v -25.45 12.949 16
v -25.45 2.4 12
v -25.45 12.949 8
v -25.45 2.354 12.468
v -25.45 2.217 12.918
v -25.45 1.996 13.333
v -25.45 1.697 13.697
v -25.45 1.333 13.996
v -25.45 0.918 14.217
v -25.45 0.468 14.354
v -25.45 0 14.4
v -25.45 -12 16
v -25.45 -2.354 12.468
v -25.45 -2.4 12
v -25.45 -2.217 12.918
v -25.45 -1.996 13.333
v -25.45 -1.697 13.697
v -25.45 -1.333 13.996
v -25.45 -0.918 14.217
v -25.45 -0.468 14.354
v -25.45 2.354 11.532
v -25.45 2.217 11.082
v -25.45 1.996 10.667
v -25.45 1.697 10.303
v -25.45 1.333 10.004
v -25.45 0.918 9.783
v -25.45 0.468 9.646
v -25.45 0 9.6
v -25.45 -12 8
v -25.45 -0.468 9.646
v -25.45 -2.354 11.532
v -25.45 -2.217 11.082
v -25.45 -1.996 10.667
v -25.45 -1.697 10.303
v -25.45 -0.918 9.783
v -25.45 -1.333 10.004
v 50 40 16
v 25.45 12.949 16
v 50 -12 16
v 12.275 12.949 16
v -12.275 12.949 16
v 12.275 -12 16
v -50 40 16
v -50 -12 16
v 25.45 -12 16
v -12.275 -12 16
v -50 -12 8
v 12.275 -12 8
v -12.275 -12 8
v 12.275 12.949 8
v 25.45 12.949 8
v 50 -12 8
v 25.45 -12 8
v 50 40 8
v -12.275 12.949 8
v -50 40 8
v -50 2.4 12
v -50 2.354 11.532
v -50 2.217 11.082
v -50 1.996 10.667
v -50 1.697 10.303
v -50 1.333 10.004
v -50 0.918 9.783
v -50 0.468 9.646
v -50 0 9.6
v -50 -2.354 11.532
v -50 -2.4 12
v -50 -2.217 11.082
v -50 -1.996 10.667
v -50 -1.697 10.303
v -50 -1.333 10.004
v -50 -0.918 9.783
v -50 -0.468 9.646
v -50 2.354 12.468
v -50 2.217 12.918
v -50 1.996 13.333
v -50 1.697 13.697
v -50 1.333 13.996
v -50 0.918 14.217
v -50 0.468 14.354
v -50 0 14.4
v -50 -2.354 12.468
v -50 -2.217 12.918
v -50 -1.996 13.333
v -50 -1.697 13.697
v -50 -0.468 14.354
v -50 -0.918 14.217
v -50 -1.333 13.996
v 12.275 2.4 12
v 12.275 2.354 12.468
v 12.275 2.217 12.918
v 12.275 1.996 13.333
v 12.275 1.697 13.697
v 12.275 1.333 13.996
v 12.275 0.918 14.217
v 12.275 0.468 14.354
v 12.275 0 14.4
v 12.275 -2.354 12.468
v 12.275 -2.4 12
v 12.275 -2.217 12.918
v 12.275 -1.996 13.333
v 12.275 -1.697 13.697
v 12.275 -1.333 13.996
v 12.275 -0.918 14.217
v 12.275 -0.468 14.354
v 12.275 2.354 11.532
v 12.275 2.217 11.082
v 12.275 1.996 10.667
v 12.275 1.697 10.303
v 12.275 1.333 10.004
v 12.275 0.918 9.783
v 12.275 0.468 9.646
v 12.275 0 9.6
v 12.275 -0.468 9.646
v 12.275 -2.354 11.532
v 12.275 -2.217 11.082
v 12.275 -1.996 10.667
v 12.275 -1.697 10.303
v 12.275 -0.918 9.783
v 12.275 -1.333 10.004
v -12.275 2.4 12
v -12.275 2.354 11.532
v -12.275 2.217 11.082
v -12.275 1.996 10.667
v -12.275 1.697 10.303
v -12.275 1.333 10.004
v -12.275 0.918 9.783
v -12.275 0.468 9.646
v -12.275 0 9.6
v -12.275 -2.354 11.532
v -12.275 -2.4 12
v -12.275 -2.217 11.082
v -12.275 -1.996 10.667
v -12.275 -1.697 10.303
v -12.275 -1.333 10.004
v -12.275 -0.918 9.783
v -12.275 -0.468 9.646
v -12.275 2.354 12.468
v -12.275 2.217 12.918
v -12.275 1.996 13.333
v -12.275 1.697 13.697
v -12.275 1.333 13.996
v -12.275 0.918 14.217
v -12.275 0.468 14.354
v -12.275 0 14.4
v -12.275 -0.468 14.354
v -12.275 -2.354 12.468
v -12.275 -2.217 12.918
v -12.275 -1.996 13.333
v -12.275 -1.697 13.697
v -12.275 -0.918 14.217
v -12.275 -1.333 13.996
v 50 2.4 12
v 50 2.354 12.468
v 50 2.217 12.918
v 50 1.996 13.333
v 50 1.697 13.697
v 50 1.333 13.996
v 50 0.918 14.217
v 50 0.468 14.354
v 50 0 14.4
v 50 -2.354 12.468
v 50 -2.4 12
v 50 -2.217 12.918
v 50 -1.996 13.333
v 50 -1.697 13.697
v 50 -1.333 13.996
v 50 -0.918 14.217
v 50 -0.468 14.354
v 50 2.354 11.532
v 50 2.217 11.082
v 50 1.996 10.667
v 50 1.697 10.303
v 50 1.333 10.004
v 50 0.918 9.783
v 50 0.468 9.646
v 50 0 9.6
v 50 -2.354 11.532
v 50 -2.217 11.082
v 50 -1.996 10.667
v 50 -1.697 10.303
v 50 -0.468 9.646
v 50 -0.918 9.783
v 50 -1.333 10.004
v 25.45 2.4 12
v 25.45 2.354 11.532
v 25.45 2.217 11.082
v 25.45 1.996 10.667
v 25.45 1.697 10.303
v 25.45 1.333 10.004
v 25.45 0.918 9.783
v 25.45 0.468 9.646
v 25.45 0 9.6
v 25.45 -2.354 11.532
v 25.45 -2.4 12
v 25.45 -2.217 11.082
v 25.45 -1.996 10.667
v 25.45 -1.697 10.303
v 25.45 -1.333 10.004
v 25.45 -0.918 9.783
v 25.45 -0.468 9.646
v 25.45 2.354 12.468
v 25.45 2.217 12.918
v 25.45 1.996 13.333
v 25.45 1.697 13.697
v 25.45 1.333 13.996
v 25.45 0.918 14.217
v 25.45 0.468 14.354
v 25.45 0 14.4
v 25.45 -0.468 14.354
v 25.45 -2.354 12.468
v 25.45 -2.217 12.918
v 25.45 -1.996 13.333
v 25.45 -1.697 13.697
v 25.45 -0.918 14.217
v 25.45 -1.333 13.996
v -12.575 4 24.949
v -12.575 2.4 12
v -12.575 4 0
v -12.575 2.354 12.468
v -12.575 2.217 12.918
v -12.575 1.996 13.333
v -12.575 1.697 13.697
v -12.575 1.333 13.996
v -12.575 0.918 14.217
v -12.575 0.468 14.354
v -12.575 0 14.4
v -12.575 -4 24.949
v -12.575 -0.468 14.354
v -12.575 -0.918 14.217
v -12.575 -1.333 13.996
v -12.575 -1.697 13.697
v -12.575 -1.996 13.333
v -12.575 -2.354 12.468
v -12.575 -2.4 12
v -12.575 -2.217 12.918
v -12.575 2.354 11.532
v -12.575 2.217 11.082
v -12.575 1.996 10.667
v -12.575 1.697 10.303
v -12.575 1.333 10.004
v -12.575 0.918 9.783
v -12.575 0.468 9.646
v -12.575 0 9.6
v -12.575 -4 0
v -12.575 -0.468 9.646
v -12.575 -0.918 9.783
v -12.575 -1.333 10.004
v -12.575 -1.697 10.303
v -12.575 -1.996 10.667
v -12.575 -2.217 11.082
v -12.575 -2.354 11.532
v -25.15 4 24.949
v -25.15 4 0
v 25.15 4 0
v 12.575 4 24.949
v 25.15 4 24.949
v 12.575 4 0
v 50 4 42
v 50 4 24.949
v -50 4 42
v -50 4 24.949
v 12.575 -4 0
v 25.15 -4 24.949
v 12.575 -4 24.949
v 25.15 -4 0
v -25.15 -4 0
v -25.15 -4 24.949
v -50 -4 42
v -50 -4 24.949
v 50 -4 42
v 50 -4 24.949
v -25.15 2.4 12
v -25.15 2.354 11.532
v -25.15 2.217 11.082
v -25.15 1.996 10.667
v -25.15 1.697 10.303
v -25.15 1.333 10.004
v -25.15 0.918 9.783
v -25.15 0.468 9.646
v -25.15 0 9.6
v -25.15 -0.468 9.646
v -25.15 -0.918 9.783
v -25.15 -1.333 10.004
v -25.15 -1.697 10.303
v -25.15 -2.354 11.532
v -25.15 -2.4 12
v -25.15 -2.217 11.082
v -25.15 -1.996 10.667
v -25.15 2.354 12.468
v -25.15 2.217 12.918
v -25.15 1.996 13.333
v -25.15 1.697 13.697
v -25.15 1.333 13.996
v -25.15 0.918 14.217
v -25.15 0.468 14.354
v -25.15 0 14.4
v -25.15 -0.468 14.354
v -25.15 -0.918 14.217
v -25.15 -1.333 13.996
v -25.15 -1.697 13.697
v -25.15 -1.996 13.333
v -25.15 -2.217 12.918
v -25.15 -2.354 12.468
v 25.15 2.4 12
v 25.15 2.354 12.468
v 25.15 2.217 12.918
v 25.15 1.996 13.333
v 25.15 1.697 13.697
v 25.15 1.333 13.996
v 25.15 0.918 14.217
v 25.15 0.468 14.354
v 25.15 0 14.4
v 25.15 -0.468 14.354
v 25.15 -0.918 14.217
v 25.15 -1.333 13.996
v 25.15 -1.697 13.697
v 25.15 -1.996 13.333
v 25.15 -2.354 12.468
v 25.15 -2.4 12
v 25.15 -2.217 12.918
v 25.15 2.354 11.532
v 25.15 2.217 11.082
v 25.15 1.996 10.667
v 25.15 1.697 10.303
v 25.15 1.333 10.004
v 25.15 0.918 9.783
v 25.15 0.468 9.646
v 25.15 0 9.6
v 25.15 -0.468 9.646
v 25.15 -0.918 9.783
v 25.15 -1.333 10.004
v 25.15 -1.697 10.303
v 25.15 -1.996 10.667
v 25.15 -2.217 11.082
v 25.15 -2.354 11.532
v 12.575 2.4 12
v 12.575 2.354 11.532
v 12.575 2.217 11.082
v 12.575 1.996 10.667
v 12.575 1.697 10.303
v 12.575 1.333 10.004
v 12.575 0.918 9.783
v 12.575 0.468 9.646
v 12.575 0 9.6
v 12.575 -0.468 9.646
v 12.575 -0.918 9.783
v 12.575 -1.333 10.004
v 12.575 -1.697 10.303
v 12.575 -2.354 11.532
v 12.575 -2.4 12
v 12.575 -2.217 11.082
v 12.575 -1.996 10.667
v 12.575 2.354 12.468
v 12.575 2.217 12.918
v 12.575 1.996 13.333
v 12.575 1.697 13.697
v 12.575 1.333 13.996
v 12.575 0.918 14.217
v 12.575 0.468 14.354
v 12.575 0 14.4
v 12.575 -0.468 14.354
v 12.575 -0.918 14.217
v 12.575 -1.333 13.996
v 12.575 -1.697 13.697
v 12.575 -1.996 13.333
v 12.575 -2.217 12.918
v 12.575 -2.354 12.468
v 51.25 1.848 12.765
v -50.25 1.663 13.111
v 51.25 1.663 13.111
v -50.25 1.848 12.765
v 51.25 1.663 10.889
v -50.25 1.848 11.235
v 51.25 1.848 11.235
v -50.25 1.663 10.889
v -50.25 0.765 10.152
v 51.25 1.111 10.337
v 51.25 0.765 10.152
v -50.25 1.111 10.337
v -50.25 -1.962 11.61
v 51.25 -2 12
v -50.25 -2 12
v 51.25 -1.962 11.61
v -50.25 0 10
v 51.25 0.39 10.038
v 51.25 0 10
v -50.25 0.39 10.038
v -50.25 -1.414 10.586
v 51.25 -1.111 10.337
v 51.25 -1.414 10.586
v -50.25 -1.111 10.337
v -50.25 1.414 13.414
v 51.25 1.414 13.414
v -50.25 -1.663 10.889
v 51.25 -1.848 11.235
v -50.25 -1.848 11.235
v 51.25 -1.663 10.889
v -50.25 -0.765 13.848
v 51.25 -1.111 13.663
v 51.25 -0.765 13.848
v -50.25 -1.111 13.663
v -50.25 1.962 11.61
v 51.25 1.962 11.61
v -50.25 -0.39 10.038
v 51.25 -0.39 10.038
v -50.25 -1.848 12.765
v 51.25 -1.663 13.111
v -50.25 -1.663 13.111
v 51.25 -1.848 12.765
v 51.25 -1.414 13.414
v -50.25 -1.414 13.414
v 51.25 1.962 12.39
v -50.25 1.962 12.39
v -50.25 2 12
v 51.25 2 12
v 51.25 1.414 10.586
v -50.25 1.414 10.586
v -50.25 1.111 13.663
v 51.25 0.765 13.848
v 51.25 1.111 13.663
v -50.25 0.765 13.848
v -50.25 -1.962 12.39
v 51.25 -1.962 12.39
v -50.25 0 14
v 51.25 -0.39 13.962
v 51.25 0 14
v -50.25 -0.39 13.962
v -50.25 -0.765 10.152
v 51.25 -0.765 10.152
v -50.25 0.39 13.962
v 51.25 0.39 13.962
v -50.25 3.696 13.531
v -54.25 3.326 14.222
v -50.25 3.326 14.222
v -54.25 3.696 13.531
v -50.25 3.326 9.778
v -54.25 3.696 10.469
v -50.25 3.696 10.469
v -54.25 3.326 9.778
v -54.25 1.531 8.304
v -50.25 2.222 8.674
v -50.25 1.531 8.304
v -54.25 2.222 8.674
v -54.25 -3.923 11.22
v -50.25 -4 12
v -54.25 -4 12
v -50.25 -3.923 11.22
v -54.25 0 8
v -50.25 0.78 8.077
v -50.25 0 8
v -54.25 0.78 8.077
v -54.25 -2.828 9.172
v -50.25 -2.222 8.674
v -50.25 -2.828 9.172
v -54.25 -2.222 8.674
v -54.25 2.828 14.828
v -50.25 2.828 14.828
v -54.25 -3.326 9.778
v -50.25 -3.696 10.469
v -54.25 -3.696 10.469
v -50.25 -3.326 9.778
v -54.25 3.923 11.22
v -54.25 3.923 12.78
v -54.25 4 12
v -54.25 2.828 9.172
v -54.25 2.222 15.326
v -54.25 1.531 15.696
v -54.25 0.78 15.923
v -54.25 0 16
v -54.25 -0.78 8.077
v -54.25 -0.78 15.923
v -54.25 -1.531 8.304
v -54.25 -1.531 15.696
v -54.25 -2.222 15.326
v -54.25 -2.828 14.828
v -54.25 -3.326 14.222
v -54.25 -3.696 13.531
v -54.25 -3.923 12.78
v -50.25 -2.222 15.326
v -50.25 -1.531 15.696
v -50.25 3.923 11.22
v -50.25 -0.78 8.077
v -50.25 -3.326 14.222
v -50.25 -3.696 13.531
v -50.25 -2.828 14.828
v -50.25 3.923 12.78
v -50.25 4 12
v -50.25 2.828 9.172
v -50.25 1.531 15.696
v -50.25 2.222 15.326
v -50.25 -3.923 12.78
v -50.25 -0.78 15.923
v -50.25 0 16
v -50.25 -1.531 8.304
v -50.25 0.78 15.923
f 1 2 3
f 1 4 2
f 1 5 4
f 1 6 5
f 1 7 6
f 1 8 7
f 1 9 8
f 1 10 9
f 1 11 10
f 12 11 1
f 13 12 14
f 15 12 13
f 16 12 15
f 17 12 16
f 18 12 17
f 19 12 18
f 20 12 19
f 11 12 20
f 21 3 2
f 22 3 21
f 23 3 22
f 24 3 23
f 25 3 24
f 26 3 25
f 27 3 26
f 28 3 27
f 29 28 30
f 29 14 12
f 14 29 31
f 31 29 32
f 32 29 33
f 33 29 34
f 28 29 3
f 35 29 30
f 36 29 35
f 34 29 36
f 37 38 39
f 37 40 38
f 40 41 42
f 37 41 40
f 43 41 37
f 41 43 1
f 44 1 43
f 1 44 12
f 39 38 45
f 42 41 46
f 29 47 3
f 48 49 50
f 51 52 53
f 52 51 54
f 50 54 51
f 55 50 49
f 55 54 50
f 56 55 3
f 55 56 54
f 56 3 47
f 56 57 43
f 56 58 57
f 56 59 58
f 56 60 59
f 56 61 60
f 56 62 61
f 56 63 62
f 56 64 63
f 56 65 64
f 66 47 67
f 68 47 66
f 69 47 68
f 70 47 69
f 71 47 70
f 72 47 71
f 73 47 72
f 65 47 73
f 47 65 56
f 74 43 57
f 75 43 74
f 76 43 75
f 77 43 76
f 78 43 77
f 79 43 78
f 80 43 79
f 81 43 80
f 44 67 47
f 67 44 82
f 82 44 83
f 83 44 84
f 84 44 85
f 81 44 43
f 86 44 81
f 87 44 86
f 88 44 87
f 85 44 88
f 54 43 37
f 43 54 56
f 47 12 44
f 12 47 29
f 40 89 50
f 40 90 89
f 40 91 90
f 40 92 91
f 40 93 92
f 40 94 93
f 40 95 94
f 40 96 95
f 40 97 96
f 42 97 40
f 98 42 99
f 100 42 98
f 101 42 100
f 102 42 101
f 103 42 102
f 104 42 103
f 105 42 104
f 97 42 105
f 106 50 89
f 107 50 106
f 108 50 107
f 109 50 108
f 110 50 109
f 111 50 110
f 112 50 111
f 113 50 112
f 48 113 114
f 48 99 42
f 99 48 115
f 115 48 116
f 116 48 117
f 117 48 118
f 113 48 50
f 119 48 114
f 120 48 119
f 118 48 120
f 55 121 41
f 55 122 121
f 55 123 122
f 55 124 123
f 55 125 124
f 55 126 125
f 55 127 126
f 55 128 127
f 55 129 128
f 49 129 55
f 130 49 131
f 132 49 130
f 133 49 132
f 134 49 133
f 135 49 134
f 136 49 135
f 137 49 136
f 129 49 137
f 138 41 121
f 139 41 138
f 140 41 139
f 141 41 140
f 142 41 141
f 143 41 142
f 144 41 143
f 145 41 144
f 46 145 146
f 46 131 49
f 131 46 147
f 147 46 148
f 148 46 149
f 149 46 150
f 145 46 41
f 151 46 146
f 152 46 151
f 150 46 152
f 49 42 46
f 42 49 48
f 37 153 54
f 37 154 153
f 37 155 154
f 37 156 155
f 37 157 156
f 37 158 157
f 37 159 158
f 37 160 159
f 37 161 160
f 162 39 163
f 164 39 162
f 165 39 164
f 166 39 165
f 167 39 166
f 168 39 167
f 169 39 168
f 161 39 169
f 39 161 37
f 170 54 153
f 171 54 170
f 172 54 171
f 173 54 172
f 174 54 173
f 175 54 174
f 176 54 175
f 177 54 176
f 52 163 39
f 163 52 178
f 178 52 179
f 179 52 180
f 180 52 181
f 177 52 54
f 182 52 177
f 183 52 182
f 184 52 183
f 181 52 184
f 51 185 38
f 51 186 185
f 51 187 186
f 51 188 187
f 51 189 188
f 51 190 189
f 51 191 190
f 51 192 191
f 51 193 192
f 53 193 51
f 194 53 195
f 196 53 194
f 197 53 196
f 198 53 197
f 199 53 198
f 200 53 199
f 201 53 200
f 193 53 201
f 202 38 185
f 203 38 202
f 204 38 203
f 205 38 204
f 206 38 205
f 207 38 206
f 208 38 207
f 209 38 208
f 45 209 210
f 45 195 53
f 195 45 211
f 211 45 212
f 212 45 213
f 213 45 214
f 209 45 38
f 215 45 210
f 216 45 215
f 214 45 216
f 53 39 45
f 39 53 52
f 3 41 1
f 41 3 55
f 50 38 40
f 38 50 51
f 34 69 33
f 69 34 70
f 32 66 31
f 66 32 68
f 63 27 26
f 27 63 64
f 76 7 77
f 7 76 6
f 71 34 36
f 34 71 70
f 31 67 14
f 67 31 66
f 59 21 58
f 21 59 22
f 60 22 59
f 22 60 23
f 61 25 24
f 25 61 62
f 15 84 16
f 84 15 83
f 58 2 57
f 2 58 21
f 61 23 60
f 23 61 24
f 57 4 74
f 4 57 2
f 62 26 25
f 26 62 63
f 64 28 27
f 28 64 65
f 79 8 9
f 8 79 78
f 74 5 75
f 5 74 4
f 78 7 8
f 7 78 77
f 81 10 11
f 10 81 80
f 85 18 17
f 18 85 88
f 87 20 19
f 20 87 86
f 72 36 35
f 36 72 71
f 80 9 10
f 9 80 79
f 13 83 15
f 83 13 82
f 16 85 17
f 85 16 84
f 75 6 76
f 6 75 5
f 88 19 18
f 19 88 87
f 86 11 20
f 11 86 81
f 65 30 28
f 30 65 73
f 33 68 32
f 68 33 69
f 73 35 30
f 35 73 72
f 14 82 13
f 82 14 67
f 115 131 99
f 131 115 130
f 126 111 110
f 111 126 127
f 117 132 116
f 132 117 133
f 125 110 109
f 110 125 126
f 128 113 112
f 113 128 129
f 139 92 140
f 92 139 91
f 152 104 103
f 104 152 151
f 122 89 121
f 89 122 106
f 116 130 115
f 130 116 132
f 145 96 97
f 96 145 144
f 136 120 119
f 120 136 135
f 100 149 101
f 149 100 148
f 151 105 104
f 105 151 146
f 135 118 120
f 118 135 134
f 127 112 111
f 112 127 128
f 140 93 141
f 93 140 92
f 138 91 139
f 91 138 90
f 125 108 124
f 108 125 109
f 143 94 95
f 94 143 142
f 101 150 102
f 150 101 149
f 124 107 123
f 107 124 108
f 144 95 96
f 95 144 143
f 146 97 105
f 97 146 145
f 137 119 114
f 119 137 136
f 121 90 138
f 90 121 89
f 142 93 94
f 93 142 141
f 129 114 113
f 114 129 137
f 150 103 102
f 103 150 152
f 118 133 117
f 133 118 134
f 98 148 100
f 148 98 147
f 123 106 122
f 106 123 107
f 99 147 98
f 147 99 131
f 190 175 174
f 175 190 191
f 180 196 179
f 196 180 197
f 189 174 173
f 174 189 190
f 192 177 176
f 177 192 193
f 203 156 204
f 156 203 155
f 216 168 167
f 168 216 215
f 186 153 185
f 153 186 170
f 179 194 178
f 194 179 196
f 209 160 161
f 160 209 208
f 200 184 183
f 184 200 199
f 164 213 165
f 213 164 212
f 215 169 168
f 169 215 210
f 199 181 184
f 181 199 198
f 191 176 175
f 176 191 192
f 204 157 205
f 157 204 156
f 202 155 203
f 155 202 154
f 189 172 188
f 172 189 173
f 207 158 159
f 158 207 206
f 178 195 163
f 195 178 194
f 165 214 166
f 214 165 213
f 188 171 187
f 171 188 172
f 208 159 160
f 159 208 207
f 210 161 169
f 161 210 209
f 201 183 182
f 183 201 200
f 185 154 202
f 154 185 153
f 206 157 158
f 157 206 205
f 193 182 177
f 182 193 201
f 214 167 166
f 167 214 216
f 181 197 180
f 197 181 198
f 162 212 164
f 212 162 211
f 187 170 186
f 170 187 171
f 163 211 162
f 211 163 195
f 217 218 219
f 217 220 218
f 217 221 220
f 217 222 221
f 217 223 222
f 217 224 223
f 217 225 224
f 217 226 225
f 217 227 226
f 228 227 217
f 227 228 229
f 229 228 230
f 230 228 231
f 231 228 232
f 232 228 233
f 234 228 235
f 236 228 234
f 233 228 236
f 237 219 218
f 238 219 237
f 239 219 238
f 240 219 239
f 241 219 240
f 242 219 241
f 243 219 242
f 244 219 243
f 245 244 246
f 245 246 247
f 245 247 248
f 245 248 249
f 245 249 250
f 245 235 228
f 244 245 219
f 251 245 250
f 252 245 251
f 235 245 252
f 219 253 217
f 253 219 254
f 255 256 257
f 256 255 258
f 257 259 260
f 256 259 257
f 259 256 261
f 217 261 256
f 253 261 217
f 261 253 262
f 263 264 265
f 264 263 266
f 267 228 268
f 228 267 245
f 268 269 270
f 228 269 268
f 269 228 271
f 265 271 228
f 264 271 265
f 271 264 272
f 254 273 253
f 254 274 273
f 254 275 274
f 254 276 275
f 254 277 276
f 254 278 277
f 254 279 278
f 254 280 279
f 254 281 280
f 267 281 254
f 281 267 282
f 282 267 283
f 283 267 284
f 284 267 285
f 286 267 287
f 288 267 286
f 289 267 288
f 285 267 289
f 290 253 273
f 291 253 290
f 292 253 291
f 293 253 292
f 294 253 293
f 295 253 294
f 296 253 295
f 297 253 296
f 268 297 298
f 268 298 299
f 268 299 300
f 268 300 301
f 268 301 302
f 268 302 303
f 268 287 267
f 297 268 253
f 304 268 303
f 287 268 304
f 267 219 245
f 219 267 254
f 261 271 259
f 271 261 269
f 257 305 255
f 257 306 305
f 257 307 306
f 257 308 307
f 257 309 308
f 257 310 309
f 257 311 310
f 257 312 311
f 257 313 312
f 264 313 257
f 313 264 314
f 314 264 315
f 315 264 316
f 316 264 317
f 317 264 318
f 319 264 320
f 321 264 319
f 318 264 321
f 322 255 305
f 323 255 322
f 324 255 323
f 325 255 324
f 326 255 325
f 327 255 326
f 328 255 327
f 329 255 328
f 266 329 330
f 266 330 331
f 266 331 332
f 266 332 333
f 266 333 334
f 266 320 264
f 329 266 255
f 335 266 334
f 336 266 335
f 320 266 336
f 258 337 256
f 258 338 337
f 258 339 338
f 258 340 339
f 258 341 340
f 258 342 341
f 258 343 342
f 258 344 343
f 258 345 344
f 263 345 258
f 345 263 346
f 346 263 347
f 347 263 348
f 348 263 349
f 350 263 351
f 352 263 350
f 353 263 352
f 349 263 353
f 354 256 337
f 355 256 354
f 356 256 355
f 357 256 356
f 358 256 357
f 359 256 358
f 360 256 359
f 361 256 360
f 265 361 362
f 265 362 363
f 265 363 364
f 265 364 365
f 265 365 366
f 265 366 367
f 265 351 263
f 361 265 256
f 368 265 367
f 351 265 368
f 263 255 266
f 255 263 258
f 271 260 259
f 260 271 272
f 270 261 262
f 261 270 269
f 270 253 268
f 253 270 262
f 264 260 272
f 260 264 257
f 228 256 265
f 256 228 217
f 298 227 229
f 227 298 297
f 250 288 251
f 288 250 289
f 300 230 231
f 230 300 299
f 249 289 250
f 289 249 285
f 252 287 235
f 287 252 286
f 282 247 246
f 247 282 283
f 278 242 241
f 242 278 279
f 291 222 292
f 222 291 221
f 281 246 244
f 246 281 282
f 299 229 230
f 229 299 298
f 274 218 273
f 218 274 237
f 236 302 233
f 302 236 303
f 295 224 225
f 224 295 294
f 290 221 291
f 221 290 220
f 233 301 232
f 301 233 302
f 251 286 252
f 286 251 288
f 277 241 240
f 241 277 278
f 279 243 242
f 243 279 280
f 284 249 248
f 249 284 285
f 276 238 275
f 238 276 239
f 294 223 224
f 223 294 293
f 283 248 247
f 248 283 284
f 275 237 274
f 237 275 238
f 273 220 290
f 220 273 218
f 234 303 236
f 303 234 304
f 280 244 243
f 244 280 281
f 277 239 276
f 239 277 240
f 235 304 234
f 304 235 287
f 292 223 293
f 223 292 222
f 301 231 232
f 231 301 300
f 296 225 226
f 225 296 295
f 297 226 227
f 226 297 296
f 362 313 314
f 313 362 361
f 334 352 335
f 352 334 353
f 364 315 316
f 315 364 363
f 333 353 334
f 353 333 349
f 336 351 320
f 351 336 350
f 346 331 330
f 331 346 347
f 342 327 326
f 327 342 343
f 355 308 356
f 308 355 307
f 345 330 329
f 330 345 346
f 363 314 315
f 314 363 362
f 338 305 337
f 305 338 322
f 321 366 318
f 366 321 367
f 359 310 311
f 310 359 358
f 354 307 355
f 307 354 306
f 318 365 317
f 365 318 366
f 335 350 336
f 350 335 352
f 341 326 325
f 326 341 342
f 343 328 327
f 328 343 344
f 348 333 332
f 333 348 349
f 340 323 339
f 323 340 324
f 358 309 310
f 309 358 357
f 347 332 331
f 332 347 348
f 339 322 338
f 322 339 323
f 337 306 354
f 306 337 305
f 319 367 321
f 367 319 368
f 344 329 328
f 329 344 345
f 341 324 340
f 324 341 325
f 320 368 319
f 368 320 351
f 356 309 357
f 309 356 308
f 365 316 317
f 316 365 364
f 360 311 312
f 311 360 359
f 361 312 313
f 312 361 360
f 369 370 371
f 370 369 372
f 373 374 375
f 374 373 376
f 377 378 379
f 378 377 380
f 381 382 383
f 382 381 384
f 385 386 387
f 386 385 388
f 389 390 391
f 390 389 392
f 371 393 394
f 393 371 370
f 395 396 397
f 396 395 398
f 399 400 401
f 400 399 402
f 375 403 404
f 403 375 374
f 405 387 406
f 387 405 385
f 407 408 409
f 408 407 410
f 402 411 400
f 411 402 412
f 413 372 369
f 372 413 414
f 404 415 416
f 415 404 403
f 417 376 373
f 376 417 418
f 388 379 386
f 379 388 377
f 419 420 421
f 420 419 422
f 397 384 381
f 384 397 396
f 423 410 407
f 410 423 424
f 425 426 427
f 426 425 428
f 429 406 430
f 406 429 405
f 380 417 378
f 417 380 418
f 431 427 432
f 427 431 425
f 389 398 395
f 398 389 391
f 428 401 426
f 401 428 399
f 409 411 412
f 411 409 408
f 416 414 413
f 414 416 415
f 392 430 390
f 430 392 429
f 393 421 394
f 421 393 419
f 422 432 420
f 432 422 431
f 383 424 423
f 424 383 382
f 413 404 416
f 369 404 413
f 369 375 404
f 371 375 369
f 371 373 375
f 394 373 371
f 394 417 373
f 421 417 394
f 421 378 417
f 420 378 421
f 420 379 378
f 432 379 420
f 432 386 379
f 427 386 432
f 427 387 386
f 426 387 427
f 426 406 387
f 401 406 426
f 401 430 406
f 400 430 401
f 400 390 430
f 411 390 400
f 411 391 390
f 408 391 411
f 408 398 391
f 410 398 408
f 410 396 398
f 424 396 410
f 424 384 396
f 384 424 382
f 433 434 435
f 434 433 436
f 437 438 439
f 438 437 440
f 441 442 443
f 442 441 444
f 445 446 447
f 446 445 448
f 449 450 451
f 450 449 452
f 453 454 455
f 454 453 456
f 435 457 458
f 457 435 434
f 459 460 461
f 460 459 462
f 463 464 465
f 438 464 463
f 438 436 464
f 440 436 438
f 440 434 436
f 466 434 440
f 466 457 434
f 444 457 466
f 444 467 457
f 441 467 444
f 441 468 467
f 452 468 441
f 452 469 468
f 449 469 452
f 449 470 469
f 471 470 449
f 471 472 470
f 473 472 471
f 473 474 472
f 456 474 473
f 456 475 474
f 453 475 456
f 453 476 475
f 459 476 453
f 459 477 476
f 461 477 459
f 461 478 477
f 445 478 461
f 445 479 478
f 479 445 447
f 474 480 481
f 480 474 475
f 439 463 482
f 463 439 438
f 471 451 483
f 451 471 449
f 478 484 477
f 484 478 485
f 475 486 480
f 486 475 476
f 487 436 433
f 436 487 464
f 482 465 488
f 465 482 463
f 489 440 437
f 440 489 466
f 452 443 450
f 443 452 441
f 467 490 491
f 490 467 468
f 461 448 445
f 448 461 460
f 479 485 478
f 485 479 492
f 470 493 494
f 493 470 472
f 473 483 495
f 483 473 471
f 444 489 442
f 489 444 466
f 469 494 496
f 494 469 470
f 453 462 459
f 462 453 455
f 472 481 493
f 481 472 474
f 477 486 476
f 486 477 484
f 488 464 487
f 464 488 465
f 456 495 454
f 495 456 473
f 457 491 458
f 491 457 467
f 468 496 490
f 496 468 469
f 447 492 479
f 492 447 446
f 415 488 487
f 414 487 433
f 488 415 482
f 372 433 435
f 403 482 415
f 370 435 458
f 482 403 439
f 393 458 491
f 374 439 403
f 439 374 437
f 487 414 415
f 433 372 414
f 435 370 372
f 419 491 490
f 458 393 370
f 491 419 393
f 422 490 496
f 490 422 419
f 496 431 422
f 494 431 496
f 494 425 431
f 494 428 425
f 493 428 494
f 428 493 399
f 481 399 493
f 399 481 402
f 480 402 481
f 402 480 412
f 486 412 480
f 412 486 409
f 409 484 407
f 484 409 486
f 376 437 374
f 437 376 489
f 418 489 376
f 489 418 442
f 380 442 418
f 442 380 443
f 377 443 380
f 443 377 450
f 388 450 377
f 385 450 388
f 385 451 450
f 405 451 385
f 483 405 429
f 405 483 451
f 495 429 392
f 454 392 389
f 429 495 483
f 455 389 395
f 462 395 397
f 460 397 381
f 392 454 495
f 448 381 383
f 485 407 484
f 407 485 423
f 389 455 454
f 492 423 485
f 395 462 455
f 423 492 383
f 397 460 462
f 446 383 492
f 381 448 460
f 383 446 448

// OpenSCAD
$fn = 32;

// ------------------------------------------------------------------------
// Butt hinge: hinge 100 mm, leaf swung 270 deg
// Every part is its own module, assembly() places every instance.
// ------------------------------------------------------------------------

// --- part 1 ---
module hinge_base() {
  difference() {
    union() {
      translate([-50, -12, -4]) cube([24.55, 52, 8]);
      translate([-12.275, -12, -4]) cube([24.55, 52, 8]);
      translate([25.45, -12, -4]) cube([24.55, 52, 8]);
      translate([-50, 12.949, -4]) cube([100, 27.051, 8]);
    }
    translate([-37.725, 0, 0]) rotate([0, 90, 0]) cylinder(h = 26.55, d = 4.8, center = true);
    translate([0, 0, 0]) rotate([0, 90, 0]) cylinder(h = 26.55, d = 4.8, center = true);
    translate([37.725, 0, 0]) rotate([0, 90, 0]) cylinder(h = 26.55, d = 4.8, center = true);
  }
}

// --- part 2 ---
module hinge_mover() {
  difference() {
    union() {
      translate([-25.15, -30, -4]) cube([12.575, 42, 8]);
      translate([12.575, -30, -4]) cube([12.575, 42, 8]);
      translate([-50, -30, -4]) cube([100, 17.051, 8]);
    }
    translate([-18.863, 0, 0]) rotate([0, 90, 0]) cylinder(h = 14.575, d = 4.8, center = true);
    translate([18.863, 0, 0]) rotate([0, 90, 0]) cylinder(h = 14.575, d = 4.8, center = true);
  }
}

// --- part 3 ---
module hinge_pin() {
  rotate([0, 90, 0]) cylinder(h = 102.5, d = 4, center = true);
  translate([-54.25, 0, 0]) rotate([0, 90, 0]) cylinder(h = 4, d = 8);
}

// --- assembly ---
module assembly() {
  color([0.80, 0.24, 0.20]) translate([0, 0, 12]) rotate([0, 0, 0]) hinge_base();
  color([0.20, 0.45, 0.75]) translate([0, 0, 12]) rotate([270, 0, 0]) hinge_mover();
  color([0.25, 0.62, 0.32]) translate([0, 0, 12]) rotate([0, 0, 0]) hinge_pin();
}

assembly();
